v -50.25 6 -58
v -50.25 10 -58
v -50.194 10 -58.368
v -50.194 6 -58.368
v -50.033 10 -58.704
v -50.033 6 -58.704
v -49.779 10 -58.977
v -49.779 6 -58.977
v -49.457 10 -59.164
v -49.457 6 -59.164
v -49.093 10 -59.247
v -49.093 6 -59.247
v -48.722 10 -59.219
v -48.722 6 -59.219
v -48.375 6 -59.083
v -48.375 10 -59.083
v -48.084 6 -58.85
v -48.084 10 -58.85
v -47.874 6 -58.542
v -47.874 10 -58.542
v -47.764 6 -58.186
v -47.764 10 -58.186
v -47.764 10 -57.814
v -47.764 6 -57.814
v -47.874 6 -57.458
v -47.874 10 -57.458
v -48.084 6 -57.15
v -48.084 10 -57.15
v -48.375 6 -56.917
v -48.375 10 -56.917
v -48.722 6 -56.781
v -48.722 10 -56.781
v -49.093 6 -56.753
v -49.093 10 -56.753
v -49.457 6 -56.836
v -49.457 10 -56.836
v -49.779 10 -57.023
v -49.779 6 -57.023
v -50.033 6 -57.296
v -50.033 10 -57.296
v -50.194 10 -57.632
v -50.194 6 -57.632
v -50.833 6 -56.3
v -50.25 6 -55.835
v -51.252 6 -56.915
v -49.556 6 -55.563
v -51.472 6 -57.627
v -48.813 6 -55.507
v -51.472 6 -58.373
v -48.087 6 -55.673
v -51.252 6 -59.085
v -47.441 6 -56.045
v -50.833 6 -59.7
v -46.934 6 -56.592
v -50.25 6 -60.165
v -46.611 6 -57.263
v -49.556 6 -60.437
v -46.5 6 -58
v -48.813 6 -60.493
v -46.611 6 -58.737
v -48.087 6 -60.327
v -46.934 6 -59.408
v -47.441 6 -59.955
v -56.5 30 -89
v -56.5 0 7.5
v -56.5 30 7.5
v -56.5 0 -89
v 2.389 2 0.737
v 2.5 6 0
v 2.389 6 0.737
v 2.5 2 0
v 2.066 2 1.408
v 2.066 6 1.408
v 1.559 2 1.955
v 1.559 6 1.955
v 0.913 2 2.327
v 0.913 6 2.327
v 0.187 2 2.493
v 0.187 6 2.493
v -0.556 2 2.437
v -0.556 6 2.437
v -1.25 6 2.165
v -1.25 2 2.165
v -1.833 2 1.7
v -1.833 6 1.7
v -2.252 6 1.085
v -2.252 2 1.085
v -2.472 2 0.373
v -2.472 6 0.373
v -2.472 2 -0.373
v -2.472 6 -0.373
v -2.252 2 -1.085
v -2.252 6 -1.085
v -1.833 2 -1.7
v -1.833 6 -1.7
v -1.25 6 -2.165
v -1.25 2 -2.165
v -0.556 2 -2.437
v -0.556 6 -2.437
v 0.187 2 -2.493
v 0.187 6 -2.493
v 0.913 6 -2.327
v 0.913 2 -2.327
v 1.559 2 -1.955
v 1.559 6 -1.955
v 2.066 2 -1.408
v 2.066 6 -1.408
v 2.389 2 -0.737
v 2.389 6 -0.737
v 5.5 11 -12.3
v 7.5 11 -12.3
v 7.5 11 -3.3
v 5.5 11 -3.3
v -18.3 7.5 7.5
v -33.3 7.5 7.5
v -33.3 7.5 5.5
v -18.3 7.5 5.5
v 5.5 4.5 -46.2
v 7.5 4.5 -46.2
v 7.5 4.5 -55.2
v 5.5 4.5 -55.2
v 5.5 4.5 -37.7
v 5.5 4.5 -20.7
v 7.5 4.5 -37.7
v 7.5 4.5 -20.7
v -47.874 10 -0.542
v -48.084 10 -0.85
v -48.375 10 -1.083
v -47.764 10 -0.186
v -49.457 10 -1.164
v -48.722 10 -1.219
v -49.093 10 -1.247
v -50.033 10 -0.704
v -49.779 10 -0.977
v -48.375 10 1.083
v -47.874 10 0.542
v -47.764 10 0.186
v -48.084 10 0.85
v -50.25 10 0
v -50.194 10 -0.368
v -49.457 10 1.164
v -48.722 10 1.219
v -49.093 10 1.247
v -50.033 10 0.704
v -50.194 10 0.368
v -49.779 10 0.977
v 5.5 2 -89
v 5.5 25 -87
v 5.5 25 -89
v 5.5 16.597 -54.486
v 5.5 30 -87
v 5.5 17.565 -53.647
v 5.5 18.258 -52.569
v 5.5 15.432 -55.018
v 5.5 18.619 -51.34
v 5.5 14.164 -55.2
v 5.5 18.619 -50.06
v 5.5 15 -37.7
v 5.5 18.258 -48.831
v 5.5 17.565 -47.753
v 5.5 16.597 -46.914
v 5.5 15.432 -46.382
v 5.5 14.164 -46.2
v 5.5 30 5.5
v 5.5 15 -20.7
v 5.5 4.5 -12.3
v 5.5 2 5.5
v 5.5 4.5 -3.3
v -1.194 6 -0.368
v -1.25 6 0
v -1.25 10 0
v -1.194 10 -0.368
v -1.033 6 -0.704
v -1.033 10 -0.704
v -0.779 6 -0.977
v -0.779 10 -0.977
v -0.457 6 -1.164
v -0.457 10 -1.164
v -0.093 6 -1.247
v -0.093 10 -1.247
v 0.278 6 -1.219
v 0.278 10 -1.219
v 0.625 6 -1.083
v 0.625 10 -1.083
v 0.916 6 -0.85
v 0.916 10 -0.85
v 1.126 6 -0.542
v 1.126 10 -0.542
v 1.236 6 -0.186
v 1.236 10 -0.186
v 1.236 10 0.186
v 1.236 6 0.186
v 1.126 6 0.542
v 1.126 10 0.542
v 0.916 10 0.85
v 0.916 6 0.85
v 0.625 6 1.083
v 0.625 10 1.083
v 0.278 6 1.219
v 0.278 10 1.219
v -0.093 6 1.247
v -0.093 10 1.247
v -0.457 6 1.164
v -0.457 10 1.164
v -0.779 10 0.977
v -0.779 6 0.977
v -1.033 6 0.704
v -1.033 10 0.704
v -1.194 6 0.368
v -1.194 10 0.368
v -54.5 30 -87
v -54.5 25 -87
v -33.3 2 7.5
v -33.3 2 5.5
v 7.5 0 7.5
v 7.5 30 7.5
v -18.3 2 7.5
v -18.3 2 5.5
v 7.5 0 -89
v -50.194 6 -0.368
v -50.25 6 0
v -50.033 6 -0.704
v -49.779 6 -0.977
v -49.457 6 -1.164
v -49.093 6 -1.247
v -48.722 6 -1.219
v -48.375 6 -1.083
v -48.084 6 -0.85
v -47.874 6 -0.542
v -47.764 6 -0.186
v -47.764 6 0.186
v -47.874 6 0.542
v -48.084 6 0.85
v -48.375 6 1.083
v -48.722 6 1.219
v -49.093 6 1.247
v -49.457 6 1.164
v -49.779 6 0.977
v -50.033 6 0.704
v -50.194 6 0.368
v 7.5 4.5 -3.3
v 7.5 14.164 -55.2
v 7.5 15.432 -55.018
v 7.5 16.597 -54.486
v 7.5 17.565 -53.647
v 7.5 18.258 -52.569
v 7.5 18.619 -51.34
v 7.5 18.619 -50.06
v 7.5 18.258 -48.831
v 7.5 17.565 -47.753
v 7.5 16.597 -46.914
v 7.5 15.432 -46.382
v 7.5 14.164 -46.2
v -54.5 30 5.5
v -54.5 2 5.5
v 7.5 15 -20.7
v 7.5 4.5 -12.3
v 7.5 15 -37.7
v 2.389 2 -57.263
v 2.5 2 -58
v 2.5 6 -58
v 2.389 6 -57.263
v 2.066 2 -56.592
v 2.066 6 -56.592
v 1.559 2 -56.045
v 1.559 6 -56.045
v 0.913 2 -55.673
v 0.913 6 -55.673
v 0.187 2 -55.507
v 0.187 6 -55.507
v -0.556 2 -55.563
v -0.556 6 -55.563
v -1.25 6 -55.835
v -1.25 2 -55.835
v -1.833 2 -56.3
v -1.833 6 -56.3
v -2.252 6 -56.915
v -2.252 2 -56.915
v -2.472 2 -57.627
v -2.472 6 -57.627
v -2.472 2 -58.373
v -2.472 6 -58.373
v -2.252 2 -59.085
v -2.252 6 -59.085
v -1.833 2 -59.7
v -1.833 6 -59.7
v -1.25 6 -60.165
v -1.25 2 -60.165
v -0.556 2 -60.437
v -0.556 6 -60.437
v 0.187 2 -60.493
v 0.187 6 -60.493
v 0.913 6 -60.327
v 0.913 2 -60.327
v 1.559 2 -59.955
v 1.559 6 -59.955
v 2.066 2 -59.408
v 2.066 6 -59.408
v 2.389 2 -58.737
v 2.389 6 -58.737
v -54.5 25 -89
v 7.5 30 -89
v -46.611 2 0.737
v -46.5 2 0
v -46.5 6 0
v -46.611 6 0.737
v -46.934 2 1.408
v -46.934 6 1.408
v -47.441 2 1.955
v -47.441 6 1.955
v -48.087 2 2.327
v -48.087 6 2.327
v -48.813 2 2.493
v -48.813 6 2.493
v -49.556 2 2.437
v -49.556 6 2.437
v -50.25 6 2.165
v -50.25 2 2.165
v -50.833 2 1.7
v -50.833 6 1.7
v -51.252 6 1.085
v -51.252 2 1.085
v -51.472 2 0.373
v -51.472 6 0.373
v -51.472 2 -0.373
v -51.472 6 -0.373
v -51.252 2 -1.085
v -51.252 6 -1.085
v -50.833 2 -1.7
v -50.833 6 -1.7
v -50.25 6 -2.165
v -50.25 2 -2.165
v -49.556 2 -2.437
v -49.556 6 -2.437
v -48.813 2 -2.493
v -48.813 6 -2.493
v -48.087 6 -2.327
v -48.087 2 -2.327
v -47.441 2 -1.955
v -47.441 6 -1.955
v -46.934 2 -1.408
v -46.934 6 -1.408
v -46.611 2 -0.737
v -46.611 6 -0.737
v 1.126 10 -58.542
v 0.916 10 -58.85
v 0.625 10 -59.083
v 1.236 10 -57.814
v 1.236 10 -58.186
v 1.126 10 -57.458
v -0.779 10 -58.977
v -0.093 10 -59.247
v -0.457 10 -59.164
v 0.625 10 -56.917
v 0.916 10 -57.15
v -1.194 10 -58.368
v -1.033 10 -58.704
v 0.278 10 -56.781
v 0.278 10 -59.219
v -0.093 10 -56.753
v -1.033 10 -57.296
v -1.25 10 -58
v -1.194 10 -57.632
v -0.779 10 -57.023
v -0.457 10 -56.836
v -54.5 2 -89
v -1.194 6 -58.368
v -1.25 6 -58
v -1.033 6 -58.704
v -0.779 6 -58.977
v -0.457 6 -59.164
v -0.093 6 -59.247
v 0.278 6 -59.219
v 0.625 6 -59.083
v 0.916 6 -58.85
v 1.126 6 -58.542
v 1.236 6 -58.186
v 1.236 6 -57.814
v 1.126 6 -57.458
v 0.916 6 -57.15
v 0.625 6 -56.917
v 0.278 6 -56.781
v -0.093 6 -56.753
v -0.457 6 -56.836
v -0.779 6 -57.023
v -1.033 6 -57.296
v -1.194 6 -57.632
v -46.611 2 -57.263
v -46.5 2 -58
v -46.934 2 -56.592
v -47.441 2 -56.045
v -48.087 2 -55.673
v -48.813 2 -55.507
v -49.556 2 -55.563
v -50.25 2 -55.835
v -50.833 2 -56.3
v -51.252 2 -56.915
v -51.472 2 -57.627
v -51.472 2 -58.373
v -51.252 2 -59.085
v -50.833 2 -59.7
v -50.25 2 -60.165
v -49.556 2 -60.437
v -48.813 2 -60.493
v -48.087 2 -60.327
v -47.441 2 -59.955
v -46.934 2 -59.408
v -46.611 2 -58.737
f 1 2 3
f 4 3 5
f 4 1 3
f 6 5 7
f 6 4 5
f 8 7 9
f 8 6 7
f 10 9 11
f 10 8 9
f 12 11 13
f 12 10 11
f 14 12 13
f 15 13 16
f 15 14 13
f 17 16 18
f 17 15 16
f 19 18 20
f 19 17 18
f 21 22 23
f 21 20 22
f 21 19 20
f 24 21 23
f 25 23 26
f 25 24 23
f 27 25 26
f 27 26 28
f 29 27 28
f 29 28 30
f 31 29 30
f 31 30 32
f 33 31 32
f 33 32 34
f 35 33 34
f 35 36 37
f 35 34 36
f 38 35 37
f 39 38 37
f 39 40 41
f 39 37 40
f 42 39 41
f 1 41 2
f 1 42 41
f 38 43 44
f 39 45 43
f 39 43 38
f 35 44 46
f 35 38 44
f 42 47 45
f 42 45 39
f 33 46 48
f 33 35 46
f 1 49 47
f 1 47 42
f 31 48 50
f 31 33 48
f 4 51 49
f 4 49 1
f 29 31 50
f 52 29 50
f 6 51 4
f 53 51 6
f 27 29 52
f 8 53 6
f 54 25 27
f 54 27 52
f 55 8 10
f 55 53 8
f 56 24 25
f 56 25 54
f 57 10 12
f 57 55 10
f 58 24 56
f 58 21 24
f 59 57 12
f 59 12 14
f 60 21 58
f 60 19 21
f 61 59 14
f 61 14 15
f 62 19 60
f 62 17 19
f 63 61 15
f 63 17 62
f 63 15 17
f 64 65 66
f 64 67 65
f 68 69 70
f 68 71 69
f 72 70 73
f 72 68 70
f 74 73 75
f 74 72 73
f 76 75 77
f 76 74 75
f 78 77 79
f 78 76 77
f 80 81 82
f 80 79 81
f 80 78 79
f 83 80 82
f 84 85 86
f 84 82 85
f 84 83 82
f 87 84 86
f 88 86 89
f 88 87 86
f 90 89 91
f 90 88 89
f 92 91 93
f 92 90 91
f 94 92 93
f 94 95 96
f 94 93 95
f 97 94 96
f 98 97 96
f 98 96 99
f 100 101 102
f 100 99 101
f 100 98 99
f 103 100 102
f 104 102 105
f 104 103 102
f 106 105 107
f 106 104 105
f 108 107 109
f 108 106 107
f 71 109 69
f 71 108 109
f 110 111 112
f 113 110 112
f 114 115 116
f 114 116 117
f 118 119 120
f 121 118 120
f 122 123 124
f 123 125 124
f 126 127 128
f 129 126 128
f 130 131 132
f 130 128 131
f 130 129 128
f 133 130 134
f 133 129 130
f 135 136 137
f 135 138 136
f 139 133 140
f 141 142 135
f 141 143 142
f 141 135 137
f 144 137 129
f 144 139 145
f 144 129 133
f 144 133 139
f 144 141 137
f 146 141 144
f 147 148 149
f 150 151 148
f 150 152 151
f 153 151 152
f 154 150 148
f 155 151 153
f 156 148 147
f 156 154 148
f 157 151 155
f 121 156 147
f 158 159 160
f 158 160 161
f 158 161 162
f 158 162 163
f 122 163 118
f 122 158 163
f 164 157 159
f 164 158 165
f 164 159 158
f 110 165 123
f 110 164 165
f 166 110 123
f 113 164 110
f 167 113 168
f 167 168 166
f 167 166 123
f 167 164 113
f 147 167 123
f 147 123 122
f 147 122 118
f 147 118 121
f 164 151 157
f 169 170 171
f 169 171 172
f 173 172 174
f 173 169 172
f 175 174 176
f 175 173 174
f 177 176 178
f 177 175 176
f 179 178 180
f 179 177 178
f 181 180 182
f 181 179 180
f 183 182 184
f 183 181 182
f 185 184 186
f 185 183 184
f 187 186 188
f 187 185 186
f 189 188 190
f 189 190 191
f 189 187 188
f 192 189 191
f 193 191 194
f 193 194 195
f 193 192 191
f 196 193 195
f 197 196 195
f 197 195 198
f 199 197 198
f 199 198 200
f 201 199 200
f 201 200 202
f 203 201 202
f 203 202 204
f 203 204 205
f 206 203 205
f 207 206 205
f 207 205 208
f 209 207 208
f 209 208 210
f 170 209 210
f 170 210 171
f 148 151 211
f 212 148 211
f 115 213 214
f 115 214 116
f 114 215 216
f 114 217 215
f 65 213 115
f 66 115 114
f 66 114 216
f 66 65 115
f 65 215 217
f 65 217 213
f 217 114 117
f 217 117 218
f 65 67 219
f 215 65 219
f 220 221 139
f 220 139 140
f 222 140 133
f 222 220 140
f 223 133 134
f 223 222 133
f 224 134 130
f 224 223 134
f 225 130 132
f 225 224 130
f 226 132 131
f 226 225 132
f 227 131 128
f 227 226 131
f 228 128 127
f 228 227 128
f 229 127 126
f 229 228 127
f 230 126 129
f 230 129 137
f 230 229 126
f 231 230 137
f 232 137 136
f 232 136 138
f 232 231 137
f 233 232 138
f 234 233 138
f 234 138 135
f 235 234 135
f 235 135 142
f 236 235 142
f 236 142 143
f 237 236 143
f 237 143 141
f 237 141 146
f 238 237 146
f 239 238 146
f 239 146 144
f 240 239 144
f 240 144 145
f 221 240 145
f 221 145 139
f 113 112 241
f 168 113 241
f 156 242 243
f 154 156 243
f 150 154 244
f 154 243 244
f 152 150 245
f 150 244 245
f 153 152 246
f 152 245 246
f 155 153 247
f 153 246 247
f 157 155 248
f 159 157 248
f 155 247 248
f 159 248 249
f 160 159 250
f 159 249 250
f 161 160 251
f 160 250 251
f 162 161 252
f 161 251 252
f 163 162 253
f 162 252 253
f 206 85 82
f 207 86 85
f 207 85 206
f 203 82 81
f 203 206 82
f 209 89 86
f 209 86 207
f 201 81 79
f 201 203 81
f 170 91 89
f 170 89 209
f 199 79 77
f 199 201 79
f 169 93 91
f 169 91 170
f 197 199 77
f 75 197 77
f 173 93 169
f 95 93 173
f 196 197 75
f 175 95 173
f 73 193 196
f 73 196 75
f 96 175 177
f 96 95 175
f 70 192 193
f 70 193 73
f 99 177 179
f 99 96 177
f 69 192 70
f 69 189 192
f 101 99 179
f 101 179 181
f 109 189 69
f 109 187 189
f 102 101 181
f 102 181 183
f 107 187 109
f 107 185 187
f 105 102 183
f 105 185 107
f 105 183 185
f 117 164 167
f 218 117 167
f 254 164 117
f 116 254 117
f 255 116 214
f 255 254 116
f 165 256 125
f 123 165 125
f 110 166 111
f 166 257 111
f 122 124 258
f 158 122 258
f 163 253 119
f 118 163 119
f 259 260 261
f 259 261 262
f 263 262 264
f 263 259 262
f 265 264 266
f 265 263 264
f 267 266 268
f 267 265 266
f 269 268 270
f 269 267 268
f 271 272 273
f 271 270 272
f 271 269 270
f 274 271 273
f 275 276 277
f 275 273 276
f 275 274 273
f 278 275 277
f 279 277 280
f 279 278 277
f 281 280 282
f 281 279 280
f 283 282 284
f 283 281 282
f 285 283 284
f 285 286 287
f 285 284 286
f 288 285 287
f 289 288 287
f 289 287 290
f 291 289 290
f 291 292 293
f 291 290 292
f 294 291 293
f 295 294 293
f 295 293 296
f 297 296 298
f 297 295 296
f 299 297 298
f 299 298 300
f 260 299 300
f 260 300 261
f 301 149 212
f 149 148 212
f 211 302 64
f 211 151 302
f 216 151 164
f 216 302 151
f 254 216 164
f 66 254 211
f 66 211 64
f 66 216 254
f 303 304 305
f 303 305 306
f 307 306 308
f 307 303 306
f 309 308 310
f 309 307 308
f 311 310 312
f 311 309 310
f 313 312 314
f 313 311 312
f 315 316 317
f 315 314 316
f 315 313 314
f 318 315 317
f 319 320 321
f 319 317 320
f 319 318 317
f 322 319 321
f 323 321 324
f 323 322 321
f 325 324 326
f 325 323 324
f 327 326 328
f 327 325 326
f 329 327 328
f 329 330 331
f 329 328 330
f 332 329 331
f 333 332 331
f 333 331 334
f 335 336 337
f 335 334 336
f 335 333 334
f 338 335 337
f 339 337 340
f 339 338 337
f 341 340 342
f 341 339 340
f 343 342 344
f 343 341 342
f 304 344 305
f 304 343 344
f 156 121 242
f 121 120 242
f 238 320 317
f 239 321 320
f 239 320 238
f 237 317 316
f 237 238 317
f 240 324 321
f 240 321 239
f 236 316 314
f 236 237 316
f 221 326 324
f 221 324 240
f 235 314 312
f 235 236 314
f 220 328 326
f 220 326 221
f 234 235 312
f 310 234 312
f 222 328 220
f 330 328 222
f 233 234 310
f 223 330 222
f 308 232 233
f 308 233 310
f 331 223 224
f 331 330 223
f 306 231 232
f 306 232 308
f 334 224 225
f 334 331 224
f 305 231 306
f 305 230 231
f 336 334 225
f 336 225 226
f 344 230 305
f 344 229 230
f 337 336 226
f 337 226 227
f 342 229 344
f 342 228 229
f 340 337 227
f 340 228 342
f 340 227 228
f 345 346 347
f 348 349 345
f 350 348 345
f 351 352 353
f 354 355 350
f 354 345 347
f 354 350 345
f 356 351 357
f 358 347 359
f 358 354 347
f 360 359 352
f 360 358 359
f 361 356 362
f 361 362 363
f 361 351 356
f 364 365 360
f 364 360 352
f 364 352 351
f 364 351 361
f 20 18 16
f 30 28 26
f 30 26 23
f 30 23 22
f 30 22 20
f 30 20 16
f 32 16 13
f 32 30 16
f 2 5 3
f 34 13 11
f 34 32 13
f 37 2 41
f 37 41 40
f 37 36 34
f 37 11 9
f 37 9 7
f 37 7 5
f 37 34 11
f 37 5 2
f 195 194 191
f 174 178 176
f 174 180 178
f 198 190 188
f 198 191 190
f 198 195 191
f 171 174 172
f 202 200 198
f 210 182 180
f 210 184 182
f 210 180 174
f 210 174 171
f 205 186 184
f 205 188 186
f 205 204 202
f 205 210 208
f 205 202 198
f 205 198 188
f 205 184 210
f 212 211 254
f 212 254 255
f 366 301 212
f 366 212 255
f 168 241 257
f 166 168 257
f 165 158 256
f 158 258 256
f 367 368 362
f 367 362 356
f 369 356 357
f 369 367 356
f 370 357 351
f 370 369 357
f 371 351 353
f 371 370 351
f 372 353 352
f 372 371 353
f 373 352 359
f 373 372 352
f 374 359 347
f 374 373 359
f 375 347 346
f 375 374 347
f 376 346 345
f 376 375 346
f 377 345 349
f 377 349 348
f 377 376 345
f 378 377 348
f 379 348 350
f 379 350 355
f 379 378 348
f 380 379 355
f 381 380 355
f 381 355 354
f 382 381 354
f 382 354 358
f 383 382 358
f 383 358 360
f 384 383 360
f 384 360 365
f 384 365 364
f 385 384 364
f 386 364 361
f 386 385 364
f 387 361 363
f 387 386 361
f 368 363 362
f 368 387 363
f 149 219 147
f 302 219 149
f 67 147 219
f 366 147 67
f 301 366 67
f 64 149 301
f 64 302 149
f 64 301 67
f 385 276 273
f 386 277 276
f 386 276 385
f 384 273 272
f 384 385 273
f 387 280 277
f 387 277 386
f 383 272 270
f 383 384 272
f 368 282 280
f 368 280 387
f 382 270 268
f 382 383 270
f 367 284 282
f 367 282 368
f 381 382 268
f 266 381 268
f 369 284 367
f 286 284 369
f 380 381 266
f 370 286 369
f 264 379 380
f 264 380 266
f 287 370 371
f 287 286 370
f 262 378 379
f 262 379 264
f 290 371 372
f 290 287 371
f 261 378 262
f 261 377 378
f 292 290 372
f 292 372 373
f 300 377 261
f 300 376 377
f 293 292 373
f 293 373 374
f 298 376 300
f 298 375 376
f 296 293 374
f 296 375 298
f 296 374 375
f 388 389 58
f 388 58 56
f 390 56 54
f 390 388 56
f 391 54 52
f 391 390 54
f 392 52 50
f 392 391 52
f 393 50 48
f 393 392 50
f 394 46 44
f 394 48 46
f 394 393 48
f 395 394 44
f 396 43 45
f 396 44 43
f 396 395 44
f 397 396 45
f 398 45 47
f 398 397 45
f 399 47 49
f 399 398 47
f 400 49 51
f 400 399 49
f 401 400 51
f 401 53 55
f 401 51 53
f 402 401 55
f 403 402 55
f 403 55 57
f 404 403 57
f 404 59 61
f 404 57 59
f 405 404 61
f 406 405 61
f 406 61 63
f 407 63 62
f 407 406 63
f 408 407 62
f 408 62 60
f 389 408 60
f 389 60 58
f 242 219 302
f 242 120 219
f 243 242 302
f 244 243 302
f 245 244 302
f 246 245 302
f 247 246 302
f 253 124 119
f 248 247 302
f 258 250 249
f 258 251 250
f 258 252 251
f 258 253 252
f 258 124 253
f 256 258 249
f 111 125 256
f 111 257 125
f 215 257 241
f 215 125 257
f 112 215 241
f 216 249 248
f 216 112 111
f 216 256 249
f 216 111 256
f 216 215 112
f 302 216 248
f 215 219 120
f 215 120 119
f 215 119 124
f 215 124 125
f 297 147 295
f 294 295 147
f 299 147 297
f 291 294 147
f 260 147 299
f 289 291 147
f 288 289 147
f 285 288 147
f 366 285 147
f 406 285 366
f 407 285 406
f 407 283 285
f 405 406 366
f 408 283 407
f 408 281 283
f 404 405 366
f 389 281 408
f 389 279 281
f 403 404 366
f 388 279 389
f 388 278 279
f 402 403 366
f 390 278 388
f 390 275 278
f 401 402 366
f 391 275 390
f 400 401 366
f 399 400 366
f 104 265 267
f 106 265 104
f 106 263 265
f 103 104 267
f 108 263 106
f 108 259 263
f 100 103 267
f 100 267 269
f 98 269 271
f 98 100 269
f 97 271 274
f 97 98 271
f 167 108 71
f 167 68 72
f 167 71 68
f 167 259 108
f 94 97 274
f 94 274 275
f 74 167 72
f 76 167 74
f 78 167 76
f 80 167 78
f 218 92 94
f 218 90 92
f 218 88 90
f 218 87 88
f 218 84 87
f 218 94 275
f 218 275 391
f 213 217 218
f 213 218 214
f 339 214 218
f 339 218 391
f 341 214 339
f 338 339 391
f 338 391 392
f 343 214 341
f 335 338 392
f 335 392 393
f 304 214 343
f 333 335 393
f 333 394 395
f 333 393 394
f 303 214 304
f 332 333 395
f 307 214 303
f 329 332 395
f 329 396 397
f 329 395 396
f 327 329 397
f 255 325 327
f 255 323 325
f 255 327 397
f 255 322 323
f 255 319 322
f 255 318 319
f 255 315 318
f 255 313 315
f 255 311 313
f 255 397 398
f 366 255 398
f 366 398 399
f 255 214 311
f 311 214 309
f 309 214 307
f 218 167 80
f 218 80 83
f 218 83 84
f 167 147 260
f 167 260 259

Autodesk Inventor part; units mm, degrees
sketch "Sketch1" plane through (0, 0, 0) normal (0, 1, 0) x (-1, 0, 0)
  point P0 (0, 0)
sketch "Sketch2" plane through (0, 0, 0) normal (0, 1, 0) x (-1, 0, 0)
  circle A0 centre (0, 0) radius 1.25
  line L0 (60.55, 0) -> (-11.55, 0) projected
  line L1 (0, -71.35) -> (0, 13.35) projected
  circle A1 centre (49, 0) radius 1.25
  circle A2 centre (0, -58) radius 1.25
  circle A3 centre (49, -58) radius 1.25
  dimension "d0" = 2.5
  dimension "d3" = 49
  dimension "d6" = 58
extrude "Extrusion1" add sketch "Sketch2" along normal blind 10
sketch "Sketch3" plane through (0, 0, 0) normal (0, 1, 0) x (-1, 0, 0)
  line L0 (52.5, 3.5) -> (-3.5, 3.5)
  line L1 (-3.5, 3.5) -> (-3.5, -85)
  line L2 (-3.5, -85) -> (52.5, -85)
  line L3 (52.5, -85) -> (52.5, 3.5)
  circle A0 centre (49, 0) radius 1.25 projected
  circle A1 centre (49, -58) radius 1.25 projected
  circle A2 centre (0, 0) radius 1.25 projected
  circle A3 centre (0, -58) radius 1.25 projected
  line L4 (54.5, 5.5) -> (-5.5, 5.5)
  line L5 (-5.5, 5.5) -> (-5.5, -87)
  line L6 (-5.5, -87) -> (54.5, -87)
  line L7 (54.5, -87) -> (54.5, 5.5)
  dimension "d11" = 3.5
  dimension "d12" = 27
  dimension "d13" = 3.5
  dimension "d14" = 3.5
  dimension "d15" = 2
extrude "Extrusion2" add sketch "Sketch3" along normal blind 2 contours L3 L2 L1 L0 | L7 L6 L5 L4
sketch "Sketch5" plane through (0, 0, 0) normal (0, 0, 1) x (1, 0, 0)
  line L0 (-54.5, 0) -> (5.5, 0) projected
  line L1 (5.5, 0) -> (5.5, 2) projected
  line L2 (-54.5, 2) -> (5.5, 2) projected
  line L3 (-54.5, 0) -> (-54.5, 2) projected
  line L4 (5.5, 0) -> (7.5, 0)
  line L5 (7.5, 0) -> (7.5, 30)
  line L6 (7.5, 30) -> (5.5, 30)
  line L7 (5.5, 30) -> (5.5, 0)
  point P0 (0, 0)
  dimension "d18" = 2
  dimension "d19" = 30
sketch3d "3D Sketch1"
sketch3d "3D Sketch2"
  line L0 (5.5, 2, -87) -> (5.5, 2, 5.5)
  line L1 (5.5, 2, 5.5) -> (-54.5, 2, 5.5)
  line L2 (-54.5, 2, 5.5) -> (-54.5, 2, -87)
sweep "Sweep2" add profiles "Sketch5" path "3D Sketch2" contours L1 L7 L6 L5 L4
sketch "Sketch6" plane through (7.5, 0, -87) normal (0, 0, -1) x (-1, 0, 0)
  line L0 (2, 30) -> (62, 30)
  line L1 (2, 30) -> (2, 2) projected
  line L2 (2, 25) -> (62, 25)
  line L3 (62, 30) -> (62, 2) projected
  line L4 (2, 25) -> (2, 2)
  line L5 (2, 2) -> (62, 2)
  line L6 (2, 2) -> (62, 2) projected
  line L7 (62, 25) -> (62, 2)
  line L8 (0, 0) -> (0, 30) projected
  line L9 (0, 30) -> (2, 30) projected
  line L10 (64, 0) -> (0, 0) projected
  line L11 (64, 0) -> (64, 30) projected
  line L12 (64, 30) -> (62, 30) projected
  point P0 (7.5, 0)
  dimension "d25" = 5
extrude "Extrusion3" add sketch "Sketch6" along normal blind 2 contours L0 L3 L2 L1 | L1 L5 L3 L12 L11 L10 L8 L9
sketch "Sketch8" plane through (-56.5, 30, 7.5) normal (0, 0, 1) x (1, 0, 0)
  line L0 (64, -30) -> (0, -30) projected
  line L1 (0, -30) -> (0, 0) projected
  line L2 (64, -30) -> (64, 0) projected
  point P0 (56.5, -30)
  point P1 (20, -30)
sketch "Sketch9" plane through (0, 2, 0) normal (0, 1, 0) x (1, 0, 0)
  circle A0 centre (0, 0) radius 1.25 projected
  circle A1 centre (0, 0) radius 1.25 projected
  circle A2 centre (-49, 0) radius 1.25 projected
  circle A3 centre (-49, 0) radius 1.25 projected
  circle A4 centre (-49, 58) radius 1.25 projected
  circle A5 centre (-49, 58) radius 1.25 projected
  circle A6 centre (0, 58) radius 1.25 projected
  circle A7 centre (0, 58) radius 1.25 projected
  circle A8 centre (0, 58) radius 1.25 projected
  circle A9 centre (0, 0) radius 2.5
  circle A10 centre (-49, 0) radius 1.25 projected
  circle A11 centre (-49, 0) radius 2.5
  circle A12 centre (0, 58) radius 2.5
  circle A13 centre (-49, 58) radius 2.5
  dimension "d44" = 5
  dimension "d45" = 5
  dimension "d46" = 5
  dimension "d47" = 5
extrude "Extrusion6" add sketch "Sketch9" along normal blind 4
sketch "Sketch11" plane through (7.5, 0, 7.5) normal (1, 0, 0) x (0, 0, -1)
  line L0 (7.5, -6) -> (7.5, 36) projected
  point P0 (7.5, 0)
ref_plane "Work Plane1" through (0, 2, 2.5) normal (0, 0, 1) x (1, 0, 0)
ref_plane "Work Plane2" through (0, 2, 2.8) normal (0, 0, 1) x (1, 0, 0)
sketch "Sketch12" plane through (7.5, 0, 7.5) normal (1, 0, 0) x (0, 0, -1)
  line L0 (7.5, -6) -> (7.5, 36) projected
  line L1 (4.7, -6) -> (4.7, 36) projected
  line L2 (13.1008, 0) -> (18.181, 0)
  line L3 (96.5, 0) -> (0, 0) projected
  point P0 (7.5, 0)
  dimension "d51" = 0
ref_plane "Work Plane3" through (-49, 6, -58) normal (0, 1, 0) x (1, 0, 0)
sketch "Sketch13" plane through (7.5, 0, 7.5) normal (1, 0, 0) x (0, 0, -1)
  line L0 (-19.3, 6) -> (115.8, 6) projected
  line L1 (10.8, 4.5) -> (19.8, 4.5)
  line L2 (19.8, 4.5) -> (19.8, 11)
  line L3 (19.8, 11) -> (10.8, 11)
  line L4 (10.8, 11) -> (10.8, 4.5)
  line L5 (28.2, 4.5) -> (45.2, 4.5)
  line L6 (45.2, 4.5) -> (45.2, 15)
  line L7 (45.2, 15) -> (28.2, 15)
  line L8 (28.2, 15) -> (28.2, 4.5)
  line L9 (4.7, -6) -> (4.7, 36) projected
  line L10 (53.7, 4.5) -> (62.7, 4.5)
  line L11 (62.7, 4.5) -> (62.7, 14.1644)
  line L12 (53.7, 14.1644) -> (53.7, 4.5)
  arc A0 (62.7, 14.1644) -> (53.7, 14.1644) centre (58.2, 14.1644) ccw
  point P0 (7.5, 0)
  point P1 (15.3, 11)
  point P2 (36.7, 15)
  dimension "d54" = 1.5
  dimension "d55" = 9
  dimension "d57" = 10.6
  dimension "d58" = 32
  dimension "d60" = 17
  dimension "d61" = 1.5
  dimension "d63" = 9
  dimension "d64" = 53.5
  dimension "d65" = 1.5
  dimension "d66" = 9
  dimension "d67" = 5
extrude "Extrusion7" cut sketch "Sketch13" against normal up to surface (2 mm away)
ref_plane "Work Plane5" through (2.7, 2, 0) normal (-1, 0, 0) x (0, -1, 0)
ref_plane "Work Plane4" through (2.5, 2, 0) normal (-1, 0, 0) x (0, -1, 0)
sketch "Sketch15" plane through (-56.5, 30, 7.5) normal (0, 0, 1) x (1, 0, 0)
  line L0 (59.2, -36) -> (59.2, 6) projected
  line L1 (-12.8, -24) -> (76.8, -24) projected
  line L2 (23.2, -22.5) -> (38.2, -22.5)
  line L3 (38.2, -22.5) -> (38.2, -28)
  line L4 (38.2, -28) -> (23.2, -28)
  line L5 (23.2, -28) -> (23.2, -22.5)
  point P0 (56.5, -30)
  dimension "d71" = 21
  dimension "d72" = 36
  dimension "d73" = 4
  dimension "d74" = 1.5
extrude "Extrusion8" cut sketch "Sketch15" against normal up to surface (2 mm away)
properties part number "PI_Skal"
